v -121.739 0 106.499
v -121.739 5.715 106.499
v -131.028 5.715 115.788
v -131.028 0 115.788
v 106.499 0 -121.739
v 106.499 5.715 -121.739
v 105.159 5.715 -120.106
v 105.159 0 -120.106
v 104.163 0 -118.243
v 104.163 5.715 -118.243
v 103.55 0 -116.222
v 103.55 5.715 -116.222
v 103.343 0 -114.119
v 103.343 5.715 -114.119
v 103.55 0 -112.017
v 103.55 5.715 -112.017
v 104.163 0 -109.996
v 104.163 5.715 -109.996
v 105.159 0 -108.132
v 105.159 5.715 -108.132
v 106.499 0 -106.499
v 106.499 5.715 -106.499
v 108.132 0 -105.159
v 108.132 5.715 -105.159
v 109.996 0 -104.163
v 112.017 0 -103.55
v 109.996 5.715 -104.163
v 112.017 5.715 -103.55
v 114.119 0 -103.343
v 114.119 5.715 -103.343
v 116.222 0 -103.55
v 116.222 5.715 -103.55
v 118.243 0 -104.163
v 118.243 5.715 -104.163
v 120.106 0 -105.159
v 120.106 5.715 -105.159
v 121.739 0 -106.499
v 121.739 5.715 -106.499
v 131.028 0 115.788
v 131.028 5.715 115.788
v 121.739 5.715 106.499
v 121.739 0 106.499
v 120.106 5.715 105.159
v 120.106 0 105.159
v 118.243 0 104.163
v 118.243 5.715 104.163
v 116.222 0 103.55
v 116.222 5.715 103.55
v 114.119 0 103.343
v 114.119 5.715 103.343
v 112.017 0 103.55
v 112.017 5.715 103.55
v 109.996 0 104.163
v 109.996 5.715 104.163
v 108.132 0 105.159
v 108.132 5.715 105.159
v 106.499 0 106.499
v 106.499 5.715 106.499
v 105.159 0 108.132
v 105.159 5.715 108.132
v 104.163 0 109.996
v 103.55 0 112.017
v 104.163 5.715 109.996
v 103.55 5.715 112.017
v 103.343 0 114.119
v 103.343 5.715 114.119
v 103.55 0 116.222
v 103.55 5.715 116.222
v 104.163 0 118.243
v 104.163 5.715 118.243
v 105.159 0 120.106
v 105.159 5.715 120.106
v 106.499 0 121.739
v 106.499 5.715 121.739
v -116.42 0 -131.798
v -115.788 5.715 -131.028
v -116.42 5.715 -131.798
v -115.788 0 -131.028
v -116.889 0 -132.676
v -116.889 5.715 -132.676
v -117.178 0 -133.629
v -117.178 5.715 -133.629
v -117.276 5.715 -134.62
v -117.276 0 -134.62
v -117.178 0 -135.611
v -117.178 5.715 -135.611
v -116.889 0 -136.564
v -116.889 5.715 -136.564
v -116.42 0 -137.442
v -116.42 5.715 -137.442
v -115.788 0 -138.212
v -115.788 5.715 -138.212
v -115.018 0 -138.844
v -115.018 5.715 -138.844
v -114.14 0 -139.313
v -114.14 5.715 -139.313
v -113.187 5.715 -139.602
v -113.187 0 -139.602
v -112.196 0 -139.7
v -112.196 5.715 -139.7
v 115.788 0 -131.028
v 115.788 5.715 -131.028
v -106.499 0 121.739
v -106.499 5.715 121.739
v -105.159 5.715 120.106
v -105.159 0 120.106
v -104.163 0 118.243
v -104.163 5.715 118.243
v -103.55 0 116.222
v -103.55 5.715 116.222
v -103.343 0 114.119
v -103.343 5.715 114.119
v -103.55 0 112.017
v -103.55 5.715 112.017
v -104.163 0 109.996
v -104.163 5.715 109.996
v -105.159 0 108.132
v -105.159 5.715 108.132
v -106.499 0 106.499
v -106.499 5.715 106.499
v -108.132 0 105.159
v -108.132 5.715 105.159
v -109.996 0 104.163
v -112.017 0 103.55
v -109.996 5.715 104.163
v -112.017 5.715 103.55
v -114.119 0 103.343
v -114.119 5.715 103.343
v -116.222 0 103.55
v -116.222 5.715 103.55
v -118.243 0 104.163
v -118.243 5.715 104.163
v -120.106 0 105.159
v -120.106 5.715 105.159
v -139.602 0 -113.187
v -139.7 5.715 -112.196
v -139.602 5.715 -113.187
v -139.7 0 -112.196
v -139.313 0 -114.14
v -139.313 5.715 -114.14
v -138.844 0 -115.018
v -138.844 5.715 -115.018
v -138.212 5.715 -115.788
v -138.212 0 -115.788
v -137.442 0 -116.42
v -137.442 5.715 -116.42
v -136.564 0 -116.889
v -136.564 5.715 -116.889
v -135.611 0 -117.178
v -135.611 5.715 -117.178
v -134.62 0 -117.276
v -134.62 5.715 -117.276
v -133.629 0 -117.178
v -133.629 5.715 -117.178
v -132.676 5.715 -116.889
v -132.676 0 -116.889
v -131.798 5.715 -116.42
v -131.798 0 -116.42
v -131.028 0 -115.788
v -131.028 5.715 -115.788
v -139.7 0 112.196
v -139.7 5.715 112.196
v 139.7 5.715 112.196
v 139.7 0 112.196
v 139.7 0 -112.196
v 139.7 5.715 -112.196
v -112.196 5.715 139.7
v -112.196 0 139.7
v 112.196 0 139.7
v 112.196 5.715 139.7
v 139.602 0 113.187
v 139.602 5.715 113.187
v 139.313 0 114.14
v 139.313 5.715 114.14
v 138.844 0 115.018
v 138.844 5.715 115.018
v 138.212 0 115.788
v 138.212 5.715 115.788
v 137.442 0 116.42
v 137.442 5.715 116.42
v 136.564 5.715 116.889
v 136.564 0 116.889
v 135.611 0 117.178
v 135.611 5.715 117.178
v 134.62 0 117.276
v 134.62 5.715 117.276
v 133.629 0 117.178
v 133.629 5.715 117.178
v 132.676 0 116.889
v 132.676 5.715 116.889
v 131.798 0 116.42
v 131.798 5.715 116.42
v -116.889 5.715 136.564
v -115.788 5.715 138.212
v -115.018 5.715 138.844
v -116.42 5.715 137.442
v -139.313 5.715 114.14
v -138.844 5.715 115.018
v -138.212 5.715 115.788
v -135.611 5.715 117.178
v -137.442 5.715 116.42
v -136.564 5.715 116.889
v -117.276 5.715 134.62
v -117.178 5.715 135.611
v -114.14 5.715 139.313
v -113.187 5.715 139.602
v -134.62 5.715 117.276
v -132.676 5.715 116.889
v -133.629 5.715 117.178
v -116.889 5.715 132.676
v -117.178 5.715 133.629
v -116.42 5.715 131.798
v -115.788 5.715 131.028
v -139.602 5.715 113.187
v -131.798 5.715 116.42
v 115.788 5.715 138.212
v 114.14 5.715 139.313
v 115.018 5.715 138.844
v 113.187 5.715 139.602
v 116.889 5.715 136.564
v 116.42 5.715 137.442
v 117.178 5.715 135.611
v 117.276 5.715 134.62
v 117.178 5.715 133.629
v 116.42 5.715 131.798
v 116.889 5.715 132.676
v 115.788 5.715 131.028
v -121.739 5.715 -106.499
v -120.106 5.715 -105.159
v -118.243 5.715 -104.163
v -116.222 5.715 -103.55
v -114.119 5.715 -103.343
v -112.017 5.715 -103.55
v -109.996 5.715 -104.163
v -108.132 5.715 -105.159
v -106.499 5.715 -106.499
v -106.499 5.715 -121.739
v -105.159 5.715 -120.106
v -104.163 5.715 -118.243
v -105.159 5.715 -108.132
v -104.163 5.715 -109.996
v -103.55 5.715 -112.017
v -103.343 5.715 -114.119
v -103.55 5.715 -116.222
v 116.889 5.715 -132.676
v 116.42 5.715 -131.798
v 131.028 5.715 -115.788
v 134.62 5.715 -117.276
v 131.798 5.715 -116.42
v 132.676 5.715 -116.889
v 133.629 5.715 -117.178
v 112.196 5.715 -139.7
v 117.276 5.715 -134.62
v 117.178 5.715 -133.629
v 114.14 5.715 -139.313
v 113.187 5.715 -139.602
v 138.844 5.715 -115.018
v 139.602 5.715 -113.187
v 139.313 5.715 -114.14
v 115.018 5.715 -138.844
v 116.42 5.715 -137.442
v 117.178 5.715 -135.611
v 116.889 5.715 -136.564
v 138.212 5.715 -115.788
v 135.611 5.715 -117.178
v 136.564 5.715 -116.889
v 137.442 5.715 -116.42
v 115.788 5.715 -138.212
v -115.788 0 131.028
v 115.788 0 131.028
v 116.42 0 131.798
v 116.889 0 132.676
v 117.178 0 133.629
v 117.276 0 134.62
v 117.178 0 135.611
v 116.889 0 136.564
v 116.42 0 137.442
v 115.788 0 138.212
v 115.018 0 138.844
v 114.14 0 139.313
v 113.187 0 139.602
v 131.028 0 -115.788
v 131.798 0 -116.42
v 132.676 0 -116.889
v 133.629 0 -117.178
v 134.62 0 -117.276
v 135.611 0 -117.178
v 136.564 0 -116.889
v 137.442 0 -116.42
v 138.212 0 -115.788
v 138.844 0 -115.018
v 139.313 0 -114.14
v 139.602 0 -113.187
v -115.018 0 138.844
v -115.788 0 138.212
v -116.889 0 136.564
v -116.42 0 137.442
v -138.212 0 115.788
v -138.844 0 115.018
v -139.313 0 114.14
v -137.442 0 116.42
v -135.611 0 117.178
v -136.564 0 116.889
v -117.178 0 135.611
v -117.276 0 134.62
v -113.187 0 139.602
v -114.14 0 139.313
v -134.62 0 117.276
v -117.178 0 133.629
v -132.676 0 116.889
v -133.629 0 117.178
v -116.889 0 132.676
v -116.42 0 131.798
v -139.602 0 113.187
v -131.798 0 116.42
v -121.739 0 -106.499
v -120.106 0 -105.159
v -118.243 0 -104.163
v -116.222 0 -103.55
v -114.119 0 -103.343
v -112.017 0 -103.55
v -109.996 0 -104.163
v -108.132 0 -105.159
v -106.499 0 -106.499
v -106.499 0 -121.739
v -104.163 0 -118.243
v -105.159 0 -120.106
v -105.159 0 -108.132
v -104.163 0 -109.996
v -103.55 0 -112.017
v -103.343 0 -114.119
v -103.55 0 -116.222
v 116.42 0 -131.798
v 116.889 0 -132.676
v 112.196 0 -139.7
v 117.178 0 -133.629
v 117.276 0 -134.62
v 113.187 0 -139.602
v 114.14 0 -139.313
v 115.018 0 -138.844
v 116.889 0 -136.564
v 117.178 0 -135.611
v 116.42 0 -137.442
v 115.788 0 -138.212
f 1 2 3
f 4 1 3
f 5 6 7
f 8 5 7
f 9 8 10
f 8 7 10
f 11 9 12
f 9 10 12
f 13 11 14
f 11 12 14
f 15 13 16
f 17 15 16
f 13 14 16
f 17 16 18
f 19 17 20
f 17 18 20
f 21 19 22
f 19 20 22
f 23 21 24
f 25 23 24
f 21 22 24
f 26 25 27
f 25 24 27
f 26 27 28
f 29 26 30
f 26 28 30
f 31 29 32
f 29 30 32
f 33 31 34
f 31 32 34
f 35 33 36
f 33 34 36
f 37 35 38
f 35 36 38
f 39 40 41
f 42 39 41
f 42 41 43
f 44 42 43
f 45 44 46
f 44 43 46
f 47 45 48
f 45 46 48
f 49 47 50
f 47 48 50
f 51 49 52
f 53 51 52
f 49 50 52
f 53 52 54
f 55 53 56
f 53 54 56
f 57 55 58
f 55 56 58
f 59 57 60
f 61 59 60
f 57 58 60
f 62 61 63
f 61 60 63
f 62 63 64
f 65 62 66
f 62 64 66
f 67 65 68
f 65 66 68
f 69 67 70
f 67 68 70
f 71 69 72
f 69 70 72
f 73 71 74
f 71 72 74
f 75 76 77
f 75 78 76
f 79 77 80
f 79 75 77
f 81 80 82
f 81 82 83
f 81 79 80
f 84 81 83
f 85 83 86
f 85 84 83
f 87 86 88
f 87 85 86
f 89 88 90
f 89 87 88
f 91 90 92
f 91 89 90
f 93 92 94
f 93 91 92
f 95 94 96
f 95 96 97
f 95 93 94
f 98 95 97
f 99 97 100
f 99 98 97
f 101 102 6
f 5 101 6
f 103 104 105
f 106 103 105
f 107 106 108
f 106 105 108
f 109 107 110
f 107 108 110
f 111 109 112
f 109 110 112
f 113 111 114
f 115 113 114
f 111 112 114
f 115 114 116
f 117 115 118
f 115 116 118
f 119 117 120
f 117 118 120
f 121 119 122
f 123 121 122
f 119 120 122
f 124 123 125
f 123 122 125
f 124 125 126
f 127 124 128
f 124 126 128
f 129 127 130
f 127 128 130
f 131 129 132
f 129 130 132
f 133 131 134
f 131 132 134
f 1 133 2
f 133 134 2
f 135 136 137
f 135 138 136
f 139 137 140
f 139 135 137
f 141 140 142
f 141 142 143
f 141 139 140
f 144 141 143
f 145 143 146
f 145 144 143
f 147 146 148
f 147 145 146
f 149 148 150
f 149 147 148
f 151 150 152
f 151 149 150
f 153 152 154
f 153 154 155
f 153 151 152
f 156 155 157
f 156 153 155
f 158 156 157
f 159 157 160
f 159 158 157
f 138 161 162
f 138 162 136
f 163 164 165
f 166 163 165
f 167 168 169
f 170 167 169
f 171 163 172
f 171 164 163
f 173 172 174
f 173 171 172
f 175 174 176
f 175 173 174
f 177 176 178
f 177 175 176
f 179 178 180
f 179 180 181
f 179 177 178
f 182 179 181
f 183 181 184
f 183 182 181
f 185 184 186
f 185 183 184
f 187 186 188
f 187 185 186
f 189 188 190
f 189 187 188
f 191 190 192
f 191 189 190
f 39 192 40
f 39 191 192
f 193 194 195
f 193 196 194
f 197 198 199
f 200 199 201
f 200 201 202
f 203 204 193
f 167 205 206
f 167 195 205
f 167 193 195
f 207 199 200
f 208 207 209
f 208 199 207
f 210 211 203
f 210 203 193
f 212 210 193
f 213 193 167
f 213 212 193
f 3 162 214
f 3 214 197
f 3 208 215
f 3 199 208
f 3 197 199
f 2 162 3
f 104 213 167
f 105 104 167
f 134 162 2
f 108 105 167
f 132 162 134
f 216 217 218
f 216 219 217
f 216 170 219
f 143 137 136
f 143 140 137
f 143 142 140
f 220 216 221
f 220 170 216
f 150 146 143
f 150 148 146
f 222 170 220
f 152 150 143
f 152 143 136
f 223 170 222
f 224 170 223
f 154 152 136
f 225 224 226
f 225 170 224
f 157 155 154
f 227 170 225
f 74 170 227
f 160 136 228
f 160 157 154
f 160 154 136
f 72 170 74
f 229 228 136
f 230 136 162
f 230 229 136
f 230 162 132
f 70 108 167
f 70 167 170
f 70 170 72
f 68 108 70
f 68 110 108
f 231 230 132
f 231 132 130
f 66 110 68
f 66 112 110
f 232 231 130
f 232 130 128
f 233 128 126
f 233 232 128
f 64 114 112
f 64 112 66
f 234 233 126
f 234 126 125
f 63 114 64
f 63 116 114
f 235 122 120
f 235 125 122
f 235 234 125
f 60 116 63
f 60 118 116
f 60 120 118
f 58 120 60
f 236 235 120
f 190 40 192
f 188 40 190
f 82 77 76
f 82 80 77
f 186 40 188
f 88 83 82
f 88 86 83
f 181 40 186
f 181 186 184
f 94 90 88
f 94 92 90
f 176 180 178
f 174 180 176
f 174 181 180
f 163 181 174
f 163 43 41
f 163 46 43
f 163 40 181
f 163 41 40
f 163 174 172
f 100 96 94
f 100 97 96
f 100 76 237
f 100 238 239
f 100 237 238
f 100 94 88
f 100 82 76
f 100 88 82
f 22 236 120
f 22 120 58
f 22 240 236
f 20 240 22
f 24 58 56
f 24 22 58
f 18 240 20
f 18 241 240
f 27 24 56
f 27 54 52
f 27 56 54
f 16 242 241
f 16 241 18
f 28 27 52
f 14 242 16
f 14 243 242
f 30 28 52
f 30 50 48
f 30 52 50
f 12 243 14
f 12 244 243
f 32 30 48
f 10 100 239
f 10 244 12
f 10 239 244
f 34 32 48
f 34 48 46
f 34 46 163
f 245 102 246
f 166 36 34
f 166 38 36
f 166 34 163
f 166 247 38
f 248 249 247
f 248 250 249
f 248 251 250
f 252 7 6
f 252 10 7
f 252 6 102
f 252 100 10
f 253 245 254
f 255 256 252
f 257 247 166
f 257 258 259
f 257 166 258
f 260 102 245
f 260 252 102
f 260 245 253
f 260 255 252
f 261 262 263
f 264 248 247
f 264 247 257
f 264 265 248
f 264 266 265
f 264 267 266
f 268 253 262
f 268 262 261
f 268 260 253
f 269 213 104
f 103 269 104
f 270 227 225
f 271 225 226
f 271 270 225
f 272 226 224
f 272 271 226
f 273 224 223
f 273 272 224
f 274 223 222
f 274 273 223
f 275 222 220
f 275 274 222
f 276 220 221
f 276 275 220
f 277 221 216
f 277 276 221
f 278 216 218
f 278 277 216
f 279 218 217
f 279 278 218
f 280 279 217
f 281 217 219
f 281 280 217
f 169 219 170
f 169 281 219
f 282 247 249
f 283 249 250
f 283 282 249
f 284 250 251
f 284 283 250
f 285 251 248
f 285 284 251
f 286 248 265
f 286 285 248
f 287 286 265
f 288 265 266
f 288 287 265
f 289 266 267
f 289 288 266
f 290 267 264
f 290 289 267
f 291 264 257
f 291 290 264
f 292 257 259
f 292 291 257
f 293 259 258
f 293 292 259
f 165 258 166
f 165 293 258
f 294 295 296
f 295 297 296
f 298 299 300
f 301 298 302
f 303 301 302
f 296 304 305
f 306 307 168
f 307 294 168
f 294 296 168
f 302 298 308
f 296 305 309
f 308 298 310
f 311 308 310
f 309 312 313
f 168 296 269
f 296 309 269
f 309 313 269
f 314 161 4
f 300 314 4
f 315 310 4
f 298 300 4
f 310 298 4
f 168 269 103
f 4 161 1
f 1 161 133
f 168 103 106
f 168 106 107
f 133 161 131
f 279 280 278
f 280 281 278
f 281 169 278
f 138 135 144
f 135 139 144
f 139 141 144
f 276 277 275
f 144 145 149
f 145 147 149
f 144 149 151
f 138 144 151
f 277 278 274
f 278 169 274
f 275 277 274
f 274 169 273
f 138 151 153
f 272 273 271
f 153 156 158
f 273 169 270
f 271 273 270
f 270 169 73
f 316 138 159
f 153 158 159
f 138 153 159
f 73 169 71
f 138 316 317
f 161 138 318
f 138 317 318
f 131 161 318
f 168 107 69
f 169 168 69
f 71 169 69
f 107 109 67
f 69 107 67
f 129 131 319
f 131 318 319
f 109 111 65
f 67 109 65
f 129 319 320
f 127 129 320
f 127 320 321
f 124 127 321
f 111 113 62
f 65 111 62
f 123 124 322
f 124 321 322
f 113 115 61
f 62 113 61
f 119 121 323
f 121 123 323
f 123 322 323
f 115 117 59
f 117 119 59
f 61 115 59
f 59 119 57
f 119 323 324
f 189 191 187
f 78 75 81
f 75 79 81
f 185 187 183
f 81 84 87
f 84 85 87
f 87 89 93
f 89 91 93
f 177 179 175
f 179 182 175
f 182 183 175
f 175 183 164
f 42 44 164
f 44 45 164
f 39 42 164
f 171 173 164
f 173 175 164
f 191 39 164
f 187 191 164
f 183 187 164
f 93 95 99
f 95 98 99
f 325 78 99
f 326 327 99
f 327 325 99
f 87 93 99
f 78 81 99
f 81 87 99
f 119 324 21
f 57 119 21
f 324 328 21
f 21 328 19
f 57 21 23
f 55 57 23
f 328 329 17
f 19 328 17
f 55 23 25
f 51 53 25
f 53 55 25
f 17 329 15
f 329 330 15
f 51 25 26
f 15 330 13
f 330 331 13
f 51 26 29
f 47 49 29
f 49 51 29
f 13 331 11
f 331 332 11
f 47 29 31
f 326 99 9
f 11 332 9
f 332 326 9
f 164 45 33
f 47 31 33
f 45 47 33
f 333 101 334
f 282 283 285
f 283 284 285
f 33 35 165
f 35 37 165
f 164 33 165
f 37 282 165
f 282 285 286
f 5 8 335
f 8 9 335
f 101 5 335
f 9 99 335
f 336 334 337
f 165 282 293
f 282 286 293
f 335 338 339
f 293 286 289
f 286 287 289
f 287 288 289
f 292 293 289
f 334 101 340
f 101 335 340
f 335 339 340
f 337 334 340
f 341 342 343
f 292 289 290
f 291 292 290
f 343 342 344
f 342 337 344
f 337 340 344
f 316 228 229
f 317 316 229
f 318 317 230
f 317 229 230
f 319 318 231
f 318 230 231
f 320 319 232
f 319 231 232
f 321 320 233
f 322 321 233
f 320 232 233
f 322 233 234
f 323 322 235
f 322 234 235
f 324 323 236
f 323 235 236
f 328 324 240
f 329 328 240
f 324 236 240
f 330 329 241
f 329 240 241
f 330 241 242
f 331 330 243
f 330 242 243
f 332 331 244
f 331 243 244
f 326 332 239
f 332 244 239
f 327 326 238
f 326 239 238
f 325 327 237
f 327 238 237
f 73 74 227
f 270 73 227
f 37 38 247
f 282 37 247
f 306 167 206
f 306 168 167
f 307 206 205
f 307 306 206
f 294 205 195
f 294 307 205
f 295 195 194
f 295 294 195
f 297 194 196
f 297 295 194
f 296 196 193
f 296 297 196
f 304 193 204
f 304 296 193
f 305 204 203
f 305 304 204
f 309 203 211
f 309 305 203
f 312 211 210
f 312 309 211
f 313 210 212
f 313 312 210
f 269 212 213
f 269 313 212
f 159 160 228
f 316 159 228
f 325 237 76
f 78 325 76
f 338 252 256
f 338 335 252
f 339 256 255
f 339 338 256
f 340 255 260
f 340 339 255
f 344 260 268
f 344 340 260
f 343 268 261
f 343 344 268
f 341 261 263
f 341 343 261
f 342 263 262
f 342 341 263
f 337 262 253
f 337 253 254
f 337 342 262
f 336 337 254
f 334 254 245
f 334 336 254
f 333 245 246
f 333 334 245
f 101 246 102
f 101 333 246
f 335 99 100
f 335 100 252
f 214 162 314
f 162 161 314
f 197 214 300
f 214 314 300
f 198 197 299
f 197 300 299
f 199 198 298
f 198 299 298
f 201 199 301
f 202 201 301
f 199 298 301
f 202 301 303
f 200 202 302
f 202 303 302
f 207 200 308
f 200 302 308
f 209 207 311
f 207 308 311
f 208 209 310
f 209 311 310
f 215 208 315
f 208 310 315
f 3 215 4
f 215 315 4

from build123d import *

# Parameters (mm, degrees)
SKETCH1_W           = 279.4
SKETCH1_H           = 279.4
BOSS_EXTRUDE1_DEPTH = 5.715
CUT_EXTRUDE4_REACH  = 199.648
SKETCH6_R           = 5.0419
CUT_EXTRUDE6_REACH  = 199.648
FILLET1_R           = 5.08


with BuildPart() as part:
    # Sketch1 → Boss-Extrude1 (new body)
    with BuildSketch(Plane(origin=(0, 0, 0), x_dir=(1, 0, 0), z_dir=(0, 1, 0))):
        Rectangle(SKETCH1_W, SKETCH1_H)
    extrude(amount=BOSS_EXTRUDE1_DEPTH)

    # Sketch6 → Cut-Extrude4 (cut, up to next)
    with BuildSketch(Plane(origin=(0, 5.715, 0), x_dir=(1, 0, 0), z_dir=(0, 1, 0)), mode=Mode.PRIVATE) as cut_extrude4_sk1:
        with Locations((-114.3, 114.3)):
            Circle(SKETCH6_R)
    cut_extrude4_tool1 = extrude(cut_extrude4_sk1.sketch, amount=-CUT_EXTRUDE4_REACH, mode=Mode.PRIVATE) & part.part
    # Sketch6 → Cut-Extrude4 (cut, up to next)
    with BuildSketch(Plane(origin=(0, 5.715, 0), x_dir=(1, 0, 0), z_dir=(0, 1, 0)), mode=Mode.PRIVATE) as cut_extrude4_sk2:
        with Locations((114.3, 114.3)):
            Circle(SKETCH6_R)
    cut_extrude4_tool2 = extrude(cut_extrude4_sk2.sketch, amount=-CUT_EXTRUDE4_REACH, mode=Mode.PRIVATE) & part.part
    # Sketch6 → Cut-Extrude4 (cut, up to next)
    with BuildSketch(Plane(origin=(0, 5.715, 0), x_dir=(1, 0, 0), z_dir=(0, 1, 0)), mode=Mode.PRIVATE) as cut_extrude4_sk3:
        with Locations((114.3, -114.3)):
            Circle(SKETCH6_R)
    cut_extrude4_tool3 = extrude(cut_extrude4_sk3.sketch, amount=-CUT_EXTRUDE4_REACH, mode=Mode.PRIVATE) & part.part
    # Sketch6 → Cut-Extrude4 (cut, up to next)
    with BuildSketch(Plane(origin=(0, 5.715, 0), x_dir=(1, 0, 0), z_dir=(0, 1, 0)), mode=Mode.PRIVATE) as cut_extrude4_sk4:
        with Locations((-114.3, -114.3)):
            Circle(SKETCH6_R)
    cut_extrude4_tool4 = extrude(cut_extrude4_sk4.sketch, amount=-CUT_EXTRUDE4_REACH, mode=Mode.PRIVATE) & part.part
    add(cut_extrude4_tool1.solids().sort_by_distance((-114.3, 5.715, -114.3))[0], mode=Mode.SUBTRACT)
    add(cut_extrude4_tool2.solids().sort_by_distance((114.3, 5.715, -114.3))[0], mode=Mode.SUBTRACT)
    add(cut_extrude4_tool3.solids().sort_by_distance((114.3, 5.715, 114.3))[0], mode=Mode.SUBTRACT)
    add(cut_extrude4_tool4.solids().sort_by_distance((-114.3, 5.715, 114.3))[0], mode=Mode.SUBTRACT)

    # Sketch8 → Cut-Extrude6 (cut, up to next)
    with BuildSketch(Plane(origin=(0, 5.715, 0), x_dir=(1, 0, 0), z_dir=(0, 1, 0)), mode=Mode.PRIVATE) as cut_extrude6_sk1:
        with BuildLine():
            Line((-139.7, 139.7), (-139.7, 124.46))
            Line((-139.7, 124.46), (-121.739487758, 106.499487758))
            ThreePointArc((-121.739487758, 106.499487758), (-106.499487758, 106.499487758), (-106.499487758, 121.739487758))
            Line((-106.499487758, 121.739487758), (-124.46, 139.7))
            Line((-124.46, 139.7), (-139.7, 139.7))
        make_face()
    cut_extrude6_tool1 = extrude(cut_extrude6_sk1.sketch, amount=-CUT_EXTRUDE6_REACH, mode=Mode.PRIVATE) & part.part
    # Sketch8 → Cut-Extrude6 (cut, up to next)
    with BuildSketch(Plane(origin=(0, 5.715, 0), x_dir=(1, 0, 0), z_dir=(0, 1, 0)), mode=Mode.PRIVATE) as cut_extrude6_sk2:
        with BuildLine():
            Line((-124.46, -139.7), (-106.499487758, -121.739487758))
            ThreePointArc((-106.499487758, -121.739487758), (-106.499487758, -106.499487758), (-121.739487758, -106.499487758))
            Line((-121.739487758, -106.499487758), (-139.7, -124.46))
            Line((-139.7, -124.46), (-139.7, -139.7))
            Line((-139.7, -139.7), (-124.46, -139.7))
        make_face()
    cut_extrude6_tool2 = extrude(cut_extrude6_sk2.sketch, amount=-CUT_EXTRUDE6_REACH, mode=Mode.PRIVATE) & part.part
    # Sketch8 → Cut-Extrude6 (cut, up to next)
    with BuildSketch(Plane(origin=(0, 5.715, 0), x_dir=(1, 0, 0), z_dir=(0, 1, 0)), mode=Mode.PRIVATE) as cut_extrude6_sk3:
        with BuildLine():
            Line((139.7, -139.7), (139.7, -124.46))
            Line((139.7, -124.46), (121.739487758, -106.499487758))
            ThreePointArc((121.739487758, -106.499487758), (106.499487758, -106.499487758), (106.499487758, -121.739487758))
            Line((106.499487758, -121.739487758), (124.46, -139.7))
            Line((124.46, -139.7), (139.7, -139.7))
        make_face()
    cut_extrude6_tool3 = extrude(cut_extrude6_sk3.sketch, amount=-CUT_EXTRUDE6_REACH, mode=Mode.PRIVATE) & part.part
    # Sketch8 → Cut-Extrude6 (cut, up to next)
    with BuildSketch(Plane(origin=(0, 5.715, 0), x_dir=(1, 0, 0), z_dir=(0, 1, 0)), mode=Mode.PRIVATE) as cut_extrude6_sk4:
        with BuildLine():
            Line((124.46, 139.7), (106.499487758, 121.739487758))
            ThreePointArc((106.499487758, 121.739487758), (106.499487758, 106.499487758), (121.739487758, 106.499487758))
            Line((121.739487758, 106.499487758), (139.7, 124.46))
            Line((139.7, 124.46), (139.7, 139.7))
            Line((139.7, 139.7), (124.46, 139.7))
        make_face()
    cut_extrude6_tool4 = extrude(cut_extrude6_sk4.sketch, amount=-CUT_EXTRUDE6_REACH, mode=Mode.PRIVATE) & part.part
    add(cut_extrude6_tool1.solids().sort_by_distance((-122.047436, 5.715, -122.047436))[0], mode=Mode.SUBTRACT)
    add(cut_extrude6_tool2.solids().sort_by_distance((-122.047436, 5.715, 122.047436))[0], mode=Mode.SUBTRACT)
    add(cut_extrude6_tool3.solids().sort_by_distance((122.047436, 5.715, 122.047436))[0], mode=Mode.SUBTRACT)
    add(cut_extrude6_tool4.solids().sort_by_distance((122.047436, 5.715, -122.047436))[0], mode=Mode.SUBTRACT)

    # Fillet1
    fillet1_edges = [part.edges().sort_by_distance(p)[0] for p in [
        (124.46, 2.8575, 139.7),
        (139.7, 2.8575, 124.46),
        (-124.46, 2.8575, 139.7),
        (-139.7, 2.8575, 124.46),
        (139.7, 2.8575, -124.46),
        (124.46, 2.8575, -139.7),
        (-139.7, 2.8575, -124.46),
        (-124.46, 2.8575, -139.7),
    ]]
    fillet(fillet1_edges, radius=FILLET1_R)


solid = part.part
